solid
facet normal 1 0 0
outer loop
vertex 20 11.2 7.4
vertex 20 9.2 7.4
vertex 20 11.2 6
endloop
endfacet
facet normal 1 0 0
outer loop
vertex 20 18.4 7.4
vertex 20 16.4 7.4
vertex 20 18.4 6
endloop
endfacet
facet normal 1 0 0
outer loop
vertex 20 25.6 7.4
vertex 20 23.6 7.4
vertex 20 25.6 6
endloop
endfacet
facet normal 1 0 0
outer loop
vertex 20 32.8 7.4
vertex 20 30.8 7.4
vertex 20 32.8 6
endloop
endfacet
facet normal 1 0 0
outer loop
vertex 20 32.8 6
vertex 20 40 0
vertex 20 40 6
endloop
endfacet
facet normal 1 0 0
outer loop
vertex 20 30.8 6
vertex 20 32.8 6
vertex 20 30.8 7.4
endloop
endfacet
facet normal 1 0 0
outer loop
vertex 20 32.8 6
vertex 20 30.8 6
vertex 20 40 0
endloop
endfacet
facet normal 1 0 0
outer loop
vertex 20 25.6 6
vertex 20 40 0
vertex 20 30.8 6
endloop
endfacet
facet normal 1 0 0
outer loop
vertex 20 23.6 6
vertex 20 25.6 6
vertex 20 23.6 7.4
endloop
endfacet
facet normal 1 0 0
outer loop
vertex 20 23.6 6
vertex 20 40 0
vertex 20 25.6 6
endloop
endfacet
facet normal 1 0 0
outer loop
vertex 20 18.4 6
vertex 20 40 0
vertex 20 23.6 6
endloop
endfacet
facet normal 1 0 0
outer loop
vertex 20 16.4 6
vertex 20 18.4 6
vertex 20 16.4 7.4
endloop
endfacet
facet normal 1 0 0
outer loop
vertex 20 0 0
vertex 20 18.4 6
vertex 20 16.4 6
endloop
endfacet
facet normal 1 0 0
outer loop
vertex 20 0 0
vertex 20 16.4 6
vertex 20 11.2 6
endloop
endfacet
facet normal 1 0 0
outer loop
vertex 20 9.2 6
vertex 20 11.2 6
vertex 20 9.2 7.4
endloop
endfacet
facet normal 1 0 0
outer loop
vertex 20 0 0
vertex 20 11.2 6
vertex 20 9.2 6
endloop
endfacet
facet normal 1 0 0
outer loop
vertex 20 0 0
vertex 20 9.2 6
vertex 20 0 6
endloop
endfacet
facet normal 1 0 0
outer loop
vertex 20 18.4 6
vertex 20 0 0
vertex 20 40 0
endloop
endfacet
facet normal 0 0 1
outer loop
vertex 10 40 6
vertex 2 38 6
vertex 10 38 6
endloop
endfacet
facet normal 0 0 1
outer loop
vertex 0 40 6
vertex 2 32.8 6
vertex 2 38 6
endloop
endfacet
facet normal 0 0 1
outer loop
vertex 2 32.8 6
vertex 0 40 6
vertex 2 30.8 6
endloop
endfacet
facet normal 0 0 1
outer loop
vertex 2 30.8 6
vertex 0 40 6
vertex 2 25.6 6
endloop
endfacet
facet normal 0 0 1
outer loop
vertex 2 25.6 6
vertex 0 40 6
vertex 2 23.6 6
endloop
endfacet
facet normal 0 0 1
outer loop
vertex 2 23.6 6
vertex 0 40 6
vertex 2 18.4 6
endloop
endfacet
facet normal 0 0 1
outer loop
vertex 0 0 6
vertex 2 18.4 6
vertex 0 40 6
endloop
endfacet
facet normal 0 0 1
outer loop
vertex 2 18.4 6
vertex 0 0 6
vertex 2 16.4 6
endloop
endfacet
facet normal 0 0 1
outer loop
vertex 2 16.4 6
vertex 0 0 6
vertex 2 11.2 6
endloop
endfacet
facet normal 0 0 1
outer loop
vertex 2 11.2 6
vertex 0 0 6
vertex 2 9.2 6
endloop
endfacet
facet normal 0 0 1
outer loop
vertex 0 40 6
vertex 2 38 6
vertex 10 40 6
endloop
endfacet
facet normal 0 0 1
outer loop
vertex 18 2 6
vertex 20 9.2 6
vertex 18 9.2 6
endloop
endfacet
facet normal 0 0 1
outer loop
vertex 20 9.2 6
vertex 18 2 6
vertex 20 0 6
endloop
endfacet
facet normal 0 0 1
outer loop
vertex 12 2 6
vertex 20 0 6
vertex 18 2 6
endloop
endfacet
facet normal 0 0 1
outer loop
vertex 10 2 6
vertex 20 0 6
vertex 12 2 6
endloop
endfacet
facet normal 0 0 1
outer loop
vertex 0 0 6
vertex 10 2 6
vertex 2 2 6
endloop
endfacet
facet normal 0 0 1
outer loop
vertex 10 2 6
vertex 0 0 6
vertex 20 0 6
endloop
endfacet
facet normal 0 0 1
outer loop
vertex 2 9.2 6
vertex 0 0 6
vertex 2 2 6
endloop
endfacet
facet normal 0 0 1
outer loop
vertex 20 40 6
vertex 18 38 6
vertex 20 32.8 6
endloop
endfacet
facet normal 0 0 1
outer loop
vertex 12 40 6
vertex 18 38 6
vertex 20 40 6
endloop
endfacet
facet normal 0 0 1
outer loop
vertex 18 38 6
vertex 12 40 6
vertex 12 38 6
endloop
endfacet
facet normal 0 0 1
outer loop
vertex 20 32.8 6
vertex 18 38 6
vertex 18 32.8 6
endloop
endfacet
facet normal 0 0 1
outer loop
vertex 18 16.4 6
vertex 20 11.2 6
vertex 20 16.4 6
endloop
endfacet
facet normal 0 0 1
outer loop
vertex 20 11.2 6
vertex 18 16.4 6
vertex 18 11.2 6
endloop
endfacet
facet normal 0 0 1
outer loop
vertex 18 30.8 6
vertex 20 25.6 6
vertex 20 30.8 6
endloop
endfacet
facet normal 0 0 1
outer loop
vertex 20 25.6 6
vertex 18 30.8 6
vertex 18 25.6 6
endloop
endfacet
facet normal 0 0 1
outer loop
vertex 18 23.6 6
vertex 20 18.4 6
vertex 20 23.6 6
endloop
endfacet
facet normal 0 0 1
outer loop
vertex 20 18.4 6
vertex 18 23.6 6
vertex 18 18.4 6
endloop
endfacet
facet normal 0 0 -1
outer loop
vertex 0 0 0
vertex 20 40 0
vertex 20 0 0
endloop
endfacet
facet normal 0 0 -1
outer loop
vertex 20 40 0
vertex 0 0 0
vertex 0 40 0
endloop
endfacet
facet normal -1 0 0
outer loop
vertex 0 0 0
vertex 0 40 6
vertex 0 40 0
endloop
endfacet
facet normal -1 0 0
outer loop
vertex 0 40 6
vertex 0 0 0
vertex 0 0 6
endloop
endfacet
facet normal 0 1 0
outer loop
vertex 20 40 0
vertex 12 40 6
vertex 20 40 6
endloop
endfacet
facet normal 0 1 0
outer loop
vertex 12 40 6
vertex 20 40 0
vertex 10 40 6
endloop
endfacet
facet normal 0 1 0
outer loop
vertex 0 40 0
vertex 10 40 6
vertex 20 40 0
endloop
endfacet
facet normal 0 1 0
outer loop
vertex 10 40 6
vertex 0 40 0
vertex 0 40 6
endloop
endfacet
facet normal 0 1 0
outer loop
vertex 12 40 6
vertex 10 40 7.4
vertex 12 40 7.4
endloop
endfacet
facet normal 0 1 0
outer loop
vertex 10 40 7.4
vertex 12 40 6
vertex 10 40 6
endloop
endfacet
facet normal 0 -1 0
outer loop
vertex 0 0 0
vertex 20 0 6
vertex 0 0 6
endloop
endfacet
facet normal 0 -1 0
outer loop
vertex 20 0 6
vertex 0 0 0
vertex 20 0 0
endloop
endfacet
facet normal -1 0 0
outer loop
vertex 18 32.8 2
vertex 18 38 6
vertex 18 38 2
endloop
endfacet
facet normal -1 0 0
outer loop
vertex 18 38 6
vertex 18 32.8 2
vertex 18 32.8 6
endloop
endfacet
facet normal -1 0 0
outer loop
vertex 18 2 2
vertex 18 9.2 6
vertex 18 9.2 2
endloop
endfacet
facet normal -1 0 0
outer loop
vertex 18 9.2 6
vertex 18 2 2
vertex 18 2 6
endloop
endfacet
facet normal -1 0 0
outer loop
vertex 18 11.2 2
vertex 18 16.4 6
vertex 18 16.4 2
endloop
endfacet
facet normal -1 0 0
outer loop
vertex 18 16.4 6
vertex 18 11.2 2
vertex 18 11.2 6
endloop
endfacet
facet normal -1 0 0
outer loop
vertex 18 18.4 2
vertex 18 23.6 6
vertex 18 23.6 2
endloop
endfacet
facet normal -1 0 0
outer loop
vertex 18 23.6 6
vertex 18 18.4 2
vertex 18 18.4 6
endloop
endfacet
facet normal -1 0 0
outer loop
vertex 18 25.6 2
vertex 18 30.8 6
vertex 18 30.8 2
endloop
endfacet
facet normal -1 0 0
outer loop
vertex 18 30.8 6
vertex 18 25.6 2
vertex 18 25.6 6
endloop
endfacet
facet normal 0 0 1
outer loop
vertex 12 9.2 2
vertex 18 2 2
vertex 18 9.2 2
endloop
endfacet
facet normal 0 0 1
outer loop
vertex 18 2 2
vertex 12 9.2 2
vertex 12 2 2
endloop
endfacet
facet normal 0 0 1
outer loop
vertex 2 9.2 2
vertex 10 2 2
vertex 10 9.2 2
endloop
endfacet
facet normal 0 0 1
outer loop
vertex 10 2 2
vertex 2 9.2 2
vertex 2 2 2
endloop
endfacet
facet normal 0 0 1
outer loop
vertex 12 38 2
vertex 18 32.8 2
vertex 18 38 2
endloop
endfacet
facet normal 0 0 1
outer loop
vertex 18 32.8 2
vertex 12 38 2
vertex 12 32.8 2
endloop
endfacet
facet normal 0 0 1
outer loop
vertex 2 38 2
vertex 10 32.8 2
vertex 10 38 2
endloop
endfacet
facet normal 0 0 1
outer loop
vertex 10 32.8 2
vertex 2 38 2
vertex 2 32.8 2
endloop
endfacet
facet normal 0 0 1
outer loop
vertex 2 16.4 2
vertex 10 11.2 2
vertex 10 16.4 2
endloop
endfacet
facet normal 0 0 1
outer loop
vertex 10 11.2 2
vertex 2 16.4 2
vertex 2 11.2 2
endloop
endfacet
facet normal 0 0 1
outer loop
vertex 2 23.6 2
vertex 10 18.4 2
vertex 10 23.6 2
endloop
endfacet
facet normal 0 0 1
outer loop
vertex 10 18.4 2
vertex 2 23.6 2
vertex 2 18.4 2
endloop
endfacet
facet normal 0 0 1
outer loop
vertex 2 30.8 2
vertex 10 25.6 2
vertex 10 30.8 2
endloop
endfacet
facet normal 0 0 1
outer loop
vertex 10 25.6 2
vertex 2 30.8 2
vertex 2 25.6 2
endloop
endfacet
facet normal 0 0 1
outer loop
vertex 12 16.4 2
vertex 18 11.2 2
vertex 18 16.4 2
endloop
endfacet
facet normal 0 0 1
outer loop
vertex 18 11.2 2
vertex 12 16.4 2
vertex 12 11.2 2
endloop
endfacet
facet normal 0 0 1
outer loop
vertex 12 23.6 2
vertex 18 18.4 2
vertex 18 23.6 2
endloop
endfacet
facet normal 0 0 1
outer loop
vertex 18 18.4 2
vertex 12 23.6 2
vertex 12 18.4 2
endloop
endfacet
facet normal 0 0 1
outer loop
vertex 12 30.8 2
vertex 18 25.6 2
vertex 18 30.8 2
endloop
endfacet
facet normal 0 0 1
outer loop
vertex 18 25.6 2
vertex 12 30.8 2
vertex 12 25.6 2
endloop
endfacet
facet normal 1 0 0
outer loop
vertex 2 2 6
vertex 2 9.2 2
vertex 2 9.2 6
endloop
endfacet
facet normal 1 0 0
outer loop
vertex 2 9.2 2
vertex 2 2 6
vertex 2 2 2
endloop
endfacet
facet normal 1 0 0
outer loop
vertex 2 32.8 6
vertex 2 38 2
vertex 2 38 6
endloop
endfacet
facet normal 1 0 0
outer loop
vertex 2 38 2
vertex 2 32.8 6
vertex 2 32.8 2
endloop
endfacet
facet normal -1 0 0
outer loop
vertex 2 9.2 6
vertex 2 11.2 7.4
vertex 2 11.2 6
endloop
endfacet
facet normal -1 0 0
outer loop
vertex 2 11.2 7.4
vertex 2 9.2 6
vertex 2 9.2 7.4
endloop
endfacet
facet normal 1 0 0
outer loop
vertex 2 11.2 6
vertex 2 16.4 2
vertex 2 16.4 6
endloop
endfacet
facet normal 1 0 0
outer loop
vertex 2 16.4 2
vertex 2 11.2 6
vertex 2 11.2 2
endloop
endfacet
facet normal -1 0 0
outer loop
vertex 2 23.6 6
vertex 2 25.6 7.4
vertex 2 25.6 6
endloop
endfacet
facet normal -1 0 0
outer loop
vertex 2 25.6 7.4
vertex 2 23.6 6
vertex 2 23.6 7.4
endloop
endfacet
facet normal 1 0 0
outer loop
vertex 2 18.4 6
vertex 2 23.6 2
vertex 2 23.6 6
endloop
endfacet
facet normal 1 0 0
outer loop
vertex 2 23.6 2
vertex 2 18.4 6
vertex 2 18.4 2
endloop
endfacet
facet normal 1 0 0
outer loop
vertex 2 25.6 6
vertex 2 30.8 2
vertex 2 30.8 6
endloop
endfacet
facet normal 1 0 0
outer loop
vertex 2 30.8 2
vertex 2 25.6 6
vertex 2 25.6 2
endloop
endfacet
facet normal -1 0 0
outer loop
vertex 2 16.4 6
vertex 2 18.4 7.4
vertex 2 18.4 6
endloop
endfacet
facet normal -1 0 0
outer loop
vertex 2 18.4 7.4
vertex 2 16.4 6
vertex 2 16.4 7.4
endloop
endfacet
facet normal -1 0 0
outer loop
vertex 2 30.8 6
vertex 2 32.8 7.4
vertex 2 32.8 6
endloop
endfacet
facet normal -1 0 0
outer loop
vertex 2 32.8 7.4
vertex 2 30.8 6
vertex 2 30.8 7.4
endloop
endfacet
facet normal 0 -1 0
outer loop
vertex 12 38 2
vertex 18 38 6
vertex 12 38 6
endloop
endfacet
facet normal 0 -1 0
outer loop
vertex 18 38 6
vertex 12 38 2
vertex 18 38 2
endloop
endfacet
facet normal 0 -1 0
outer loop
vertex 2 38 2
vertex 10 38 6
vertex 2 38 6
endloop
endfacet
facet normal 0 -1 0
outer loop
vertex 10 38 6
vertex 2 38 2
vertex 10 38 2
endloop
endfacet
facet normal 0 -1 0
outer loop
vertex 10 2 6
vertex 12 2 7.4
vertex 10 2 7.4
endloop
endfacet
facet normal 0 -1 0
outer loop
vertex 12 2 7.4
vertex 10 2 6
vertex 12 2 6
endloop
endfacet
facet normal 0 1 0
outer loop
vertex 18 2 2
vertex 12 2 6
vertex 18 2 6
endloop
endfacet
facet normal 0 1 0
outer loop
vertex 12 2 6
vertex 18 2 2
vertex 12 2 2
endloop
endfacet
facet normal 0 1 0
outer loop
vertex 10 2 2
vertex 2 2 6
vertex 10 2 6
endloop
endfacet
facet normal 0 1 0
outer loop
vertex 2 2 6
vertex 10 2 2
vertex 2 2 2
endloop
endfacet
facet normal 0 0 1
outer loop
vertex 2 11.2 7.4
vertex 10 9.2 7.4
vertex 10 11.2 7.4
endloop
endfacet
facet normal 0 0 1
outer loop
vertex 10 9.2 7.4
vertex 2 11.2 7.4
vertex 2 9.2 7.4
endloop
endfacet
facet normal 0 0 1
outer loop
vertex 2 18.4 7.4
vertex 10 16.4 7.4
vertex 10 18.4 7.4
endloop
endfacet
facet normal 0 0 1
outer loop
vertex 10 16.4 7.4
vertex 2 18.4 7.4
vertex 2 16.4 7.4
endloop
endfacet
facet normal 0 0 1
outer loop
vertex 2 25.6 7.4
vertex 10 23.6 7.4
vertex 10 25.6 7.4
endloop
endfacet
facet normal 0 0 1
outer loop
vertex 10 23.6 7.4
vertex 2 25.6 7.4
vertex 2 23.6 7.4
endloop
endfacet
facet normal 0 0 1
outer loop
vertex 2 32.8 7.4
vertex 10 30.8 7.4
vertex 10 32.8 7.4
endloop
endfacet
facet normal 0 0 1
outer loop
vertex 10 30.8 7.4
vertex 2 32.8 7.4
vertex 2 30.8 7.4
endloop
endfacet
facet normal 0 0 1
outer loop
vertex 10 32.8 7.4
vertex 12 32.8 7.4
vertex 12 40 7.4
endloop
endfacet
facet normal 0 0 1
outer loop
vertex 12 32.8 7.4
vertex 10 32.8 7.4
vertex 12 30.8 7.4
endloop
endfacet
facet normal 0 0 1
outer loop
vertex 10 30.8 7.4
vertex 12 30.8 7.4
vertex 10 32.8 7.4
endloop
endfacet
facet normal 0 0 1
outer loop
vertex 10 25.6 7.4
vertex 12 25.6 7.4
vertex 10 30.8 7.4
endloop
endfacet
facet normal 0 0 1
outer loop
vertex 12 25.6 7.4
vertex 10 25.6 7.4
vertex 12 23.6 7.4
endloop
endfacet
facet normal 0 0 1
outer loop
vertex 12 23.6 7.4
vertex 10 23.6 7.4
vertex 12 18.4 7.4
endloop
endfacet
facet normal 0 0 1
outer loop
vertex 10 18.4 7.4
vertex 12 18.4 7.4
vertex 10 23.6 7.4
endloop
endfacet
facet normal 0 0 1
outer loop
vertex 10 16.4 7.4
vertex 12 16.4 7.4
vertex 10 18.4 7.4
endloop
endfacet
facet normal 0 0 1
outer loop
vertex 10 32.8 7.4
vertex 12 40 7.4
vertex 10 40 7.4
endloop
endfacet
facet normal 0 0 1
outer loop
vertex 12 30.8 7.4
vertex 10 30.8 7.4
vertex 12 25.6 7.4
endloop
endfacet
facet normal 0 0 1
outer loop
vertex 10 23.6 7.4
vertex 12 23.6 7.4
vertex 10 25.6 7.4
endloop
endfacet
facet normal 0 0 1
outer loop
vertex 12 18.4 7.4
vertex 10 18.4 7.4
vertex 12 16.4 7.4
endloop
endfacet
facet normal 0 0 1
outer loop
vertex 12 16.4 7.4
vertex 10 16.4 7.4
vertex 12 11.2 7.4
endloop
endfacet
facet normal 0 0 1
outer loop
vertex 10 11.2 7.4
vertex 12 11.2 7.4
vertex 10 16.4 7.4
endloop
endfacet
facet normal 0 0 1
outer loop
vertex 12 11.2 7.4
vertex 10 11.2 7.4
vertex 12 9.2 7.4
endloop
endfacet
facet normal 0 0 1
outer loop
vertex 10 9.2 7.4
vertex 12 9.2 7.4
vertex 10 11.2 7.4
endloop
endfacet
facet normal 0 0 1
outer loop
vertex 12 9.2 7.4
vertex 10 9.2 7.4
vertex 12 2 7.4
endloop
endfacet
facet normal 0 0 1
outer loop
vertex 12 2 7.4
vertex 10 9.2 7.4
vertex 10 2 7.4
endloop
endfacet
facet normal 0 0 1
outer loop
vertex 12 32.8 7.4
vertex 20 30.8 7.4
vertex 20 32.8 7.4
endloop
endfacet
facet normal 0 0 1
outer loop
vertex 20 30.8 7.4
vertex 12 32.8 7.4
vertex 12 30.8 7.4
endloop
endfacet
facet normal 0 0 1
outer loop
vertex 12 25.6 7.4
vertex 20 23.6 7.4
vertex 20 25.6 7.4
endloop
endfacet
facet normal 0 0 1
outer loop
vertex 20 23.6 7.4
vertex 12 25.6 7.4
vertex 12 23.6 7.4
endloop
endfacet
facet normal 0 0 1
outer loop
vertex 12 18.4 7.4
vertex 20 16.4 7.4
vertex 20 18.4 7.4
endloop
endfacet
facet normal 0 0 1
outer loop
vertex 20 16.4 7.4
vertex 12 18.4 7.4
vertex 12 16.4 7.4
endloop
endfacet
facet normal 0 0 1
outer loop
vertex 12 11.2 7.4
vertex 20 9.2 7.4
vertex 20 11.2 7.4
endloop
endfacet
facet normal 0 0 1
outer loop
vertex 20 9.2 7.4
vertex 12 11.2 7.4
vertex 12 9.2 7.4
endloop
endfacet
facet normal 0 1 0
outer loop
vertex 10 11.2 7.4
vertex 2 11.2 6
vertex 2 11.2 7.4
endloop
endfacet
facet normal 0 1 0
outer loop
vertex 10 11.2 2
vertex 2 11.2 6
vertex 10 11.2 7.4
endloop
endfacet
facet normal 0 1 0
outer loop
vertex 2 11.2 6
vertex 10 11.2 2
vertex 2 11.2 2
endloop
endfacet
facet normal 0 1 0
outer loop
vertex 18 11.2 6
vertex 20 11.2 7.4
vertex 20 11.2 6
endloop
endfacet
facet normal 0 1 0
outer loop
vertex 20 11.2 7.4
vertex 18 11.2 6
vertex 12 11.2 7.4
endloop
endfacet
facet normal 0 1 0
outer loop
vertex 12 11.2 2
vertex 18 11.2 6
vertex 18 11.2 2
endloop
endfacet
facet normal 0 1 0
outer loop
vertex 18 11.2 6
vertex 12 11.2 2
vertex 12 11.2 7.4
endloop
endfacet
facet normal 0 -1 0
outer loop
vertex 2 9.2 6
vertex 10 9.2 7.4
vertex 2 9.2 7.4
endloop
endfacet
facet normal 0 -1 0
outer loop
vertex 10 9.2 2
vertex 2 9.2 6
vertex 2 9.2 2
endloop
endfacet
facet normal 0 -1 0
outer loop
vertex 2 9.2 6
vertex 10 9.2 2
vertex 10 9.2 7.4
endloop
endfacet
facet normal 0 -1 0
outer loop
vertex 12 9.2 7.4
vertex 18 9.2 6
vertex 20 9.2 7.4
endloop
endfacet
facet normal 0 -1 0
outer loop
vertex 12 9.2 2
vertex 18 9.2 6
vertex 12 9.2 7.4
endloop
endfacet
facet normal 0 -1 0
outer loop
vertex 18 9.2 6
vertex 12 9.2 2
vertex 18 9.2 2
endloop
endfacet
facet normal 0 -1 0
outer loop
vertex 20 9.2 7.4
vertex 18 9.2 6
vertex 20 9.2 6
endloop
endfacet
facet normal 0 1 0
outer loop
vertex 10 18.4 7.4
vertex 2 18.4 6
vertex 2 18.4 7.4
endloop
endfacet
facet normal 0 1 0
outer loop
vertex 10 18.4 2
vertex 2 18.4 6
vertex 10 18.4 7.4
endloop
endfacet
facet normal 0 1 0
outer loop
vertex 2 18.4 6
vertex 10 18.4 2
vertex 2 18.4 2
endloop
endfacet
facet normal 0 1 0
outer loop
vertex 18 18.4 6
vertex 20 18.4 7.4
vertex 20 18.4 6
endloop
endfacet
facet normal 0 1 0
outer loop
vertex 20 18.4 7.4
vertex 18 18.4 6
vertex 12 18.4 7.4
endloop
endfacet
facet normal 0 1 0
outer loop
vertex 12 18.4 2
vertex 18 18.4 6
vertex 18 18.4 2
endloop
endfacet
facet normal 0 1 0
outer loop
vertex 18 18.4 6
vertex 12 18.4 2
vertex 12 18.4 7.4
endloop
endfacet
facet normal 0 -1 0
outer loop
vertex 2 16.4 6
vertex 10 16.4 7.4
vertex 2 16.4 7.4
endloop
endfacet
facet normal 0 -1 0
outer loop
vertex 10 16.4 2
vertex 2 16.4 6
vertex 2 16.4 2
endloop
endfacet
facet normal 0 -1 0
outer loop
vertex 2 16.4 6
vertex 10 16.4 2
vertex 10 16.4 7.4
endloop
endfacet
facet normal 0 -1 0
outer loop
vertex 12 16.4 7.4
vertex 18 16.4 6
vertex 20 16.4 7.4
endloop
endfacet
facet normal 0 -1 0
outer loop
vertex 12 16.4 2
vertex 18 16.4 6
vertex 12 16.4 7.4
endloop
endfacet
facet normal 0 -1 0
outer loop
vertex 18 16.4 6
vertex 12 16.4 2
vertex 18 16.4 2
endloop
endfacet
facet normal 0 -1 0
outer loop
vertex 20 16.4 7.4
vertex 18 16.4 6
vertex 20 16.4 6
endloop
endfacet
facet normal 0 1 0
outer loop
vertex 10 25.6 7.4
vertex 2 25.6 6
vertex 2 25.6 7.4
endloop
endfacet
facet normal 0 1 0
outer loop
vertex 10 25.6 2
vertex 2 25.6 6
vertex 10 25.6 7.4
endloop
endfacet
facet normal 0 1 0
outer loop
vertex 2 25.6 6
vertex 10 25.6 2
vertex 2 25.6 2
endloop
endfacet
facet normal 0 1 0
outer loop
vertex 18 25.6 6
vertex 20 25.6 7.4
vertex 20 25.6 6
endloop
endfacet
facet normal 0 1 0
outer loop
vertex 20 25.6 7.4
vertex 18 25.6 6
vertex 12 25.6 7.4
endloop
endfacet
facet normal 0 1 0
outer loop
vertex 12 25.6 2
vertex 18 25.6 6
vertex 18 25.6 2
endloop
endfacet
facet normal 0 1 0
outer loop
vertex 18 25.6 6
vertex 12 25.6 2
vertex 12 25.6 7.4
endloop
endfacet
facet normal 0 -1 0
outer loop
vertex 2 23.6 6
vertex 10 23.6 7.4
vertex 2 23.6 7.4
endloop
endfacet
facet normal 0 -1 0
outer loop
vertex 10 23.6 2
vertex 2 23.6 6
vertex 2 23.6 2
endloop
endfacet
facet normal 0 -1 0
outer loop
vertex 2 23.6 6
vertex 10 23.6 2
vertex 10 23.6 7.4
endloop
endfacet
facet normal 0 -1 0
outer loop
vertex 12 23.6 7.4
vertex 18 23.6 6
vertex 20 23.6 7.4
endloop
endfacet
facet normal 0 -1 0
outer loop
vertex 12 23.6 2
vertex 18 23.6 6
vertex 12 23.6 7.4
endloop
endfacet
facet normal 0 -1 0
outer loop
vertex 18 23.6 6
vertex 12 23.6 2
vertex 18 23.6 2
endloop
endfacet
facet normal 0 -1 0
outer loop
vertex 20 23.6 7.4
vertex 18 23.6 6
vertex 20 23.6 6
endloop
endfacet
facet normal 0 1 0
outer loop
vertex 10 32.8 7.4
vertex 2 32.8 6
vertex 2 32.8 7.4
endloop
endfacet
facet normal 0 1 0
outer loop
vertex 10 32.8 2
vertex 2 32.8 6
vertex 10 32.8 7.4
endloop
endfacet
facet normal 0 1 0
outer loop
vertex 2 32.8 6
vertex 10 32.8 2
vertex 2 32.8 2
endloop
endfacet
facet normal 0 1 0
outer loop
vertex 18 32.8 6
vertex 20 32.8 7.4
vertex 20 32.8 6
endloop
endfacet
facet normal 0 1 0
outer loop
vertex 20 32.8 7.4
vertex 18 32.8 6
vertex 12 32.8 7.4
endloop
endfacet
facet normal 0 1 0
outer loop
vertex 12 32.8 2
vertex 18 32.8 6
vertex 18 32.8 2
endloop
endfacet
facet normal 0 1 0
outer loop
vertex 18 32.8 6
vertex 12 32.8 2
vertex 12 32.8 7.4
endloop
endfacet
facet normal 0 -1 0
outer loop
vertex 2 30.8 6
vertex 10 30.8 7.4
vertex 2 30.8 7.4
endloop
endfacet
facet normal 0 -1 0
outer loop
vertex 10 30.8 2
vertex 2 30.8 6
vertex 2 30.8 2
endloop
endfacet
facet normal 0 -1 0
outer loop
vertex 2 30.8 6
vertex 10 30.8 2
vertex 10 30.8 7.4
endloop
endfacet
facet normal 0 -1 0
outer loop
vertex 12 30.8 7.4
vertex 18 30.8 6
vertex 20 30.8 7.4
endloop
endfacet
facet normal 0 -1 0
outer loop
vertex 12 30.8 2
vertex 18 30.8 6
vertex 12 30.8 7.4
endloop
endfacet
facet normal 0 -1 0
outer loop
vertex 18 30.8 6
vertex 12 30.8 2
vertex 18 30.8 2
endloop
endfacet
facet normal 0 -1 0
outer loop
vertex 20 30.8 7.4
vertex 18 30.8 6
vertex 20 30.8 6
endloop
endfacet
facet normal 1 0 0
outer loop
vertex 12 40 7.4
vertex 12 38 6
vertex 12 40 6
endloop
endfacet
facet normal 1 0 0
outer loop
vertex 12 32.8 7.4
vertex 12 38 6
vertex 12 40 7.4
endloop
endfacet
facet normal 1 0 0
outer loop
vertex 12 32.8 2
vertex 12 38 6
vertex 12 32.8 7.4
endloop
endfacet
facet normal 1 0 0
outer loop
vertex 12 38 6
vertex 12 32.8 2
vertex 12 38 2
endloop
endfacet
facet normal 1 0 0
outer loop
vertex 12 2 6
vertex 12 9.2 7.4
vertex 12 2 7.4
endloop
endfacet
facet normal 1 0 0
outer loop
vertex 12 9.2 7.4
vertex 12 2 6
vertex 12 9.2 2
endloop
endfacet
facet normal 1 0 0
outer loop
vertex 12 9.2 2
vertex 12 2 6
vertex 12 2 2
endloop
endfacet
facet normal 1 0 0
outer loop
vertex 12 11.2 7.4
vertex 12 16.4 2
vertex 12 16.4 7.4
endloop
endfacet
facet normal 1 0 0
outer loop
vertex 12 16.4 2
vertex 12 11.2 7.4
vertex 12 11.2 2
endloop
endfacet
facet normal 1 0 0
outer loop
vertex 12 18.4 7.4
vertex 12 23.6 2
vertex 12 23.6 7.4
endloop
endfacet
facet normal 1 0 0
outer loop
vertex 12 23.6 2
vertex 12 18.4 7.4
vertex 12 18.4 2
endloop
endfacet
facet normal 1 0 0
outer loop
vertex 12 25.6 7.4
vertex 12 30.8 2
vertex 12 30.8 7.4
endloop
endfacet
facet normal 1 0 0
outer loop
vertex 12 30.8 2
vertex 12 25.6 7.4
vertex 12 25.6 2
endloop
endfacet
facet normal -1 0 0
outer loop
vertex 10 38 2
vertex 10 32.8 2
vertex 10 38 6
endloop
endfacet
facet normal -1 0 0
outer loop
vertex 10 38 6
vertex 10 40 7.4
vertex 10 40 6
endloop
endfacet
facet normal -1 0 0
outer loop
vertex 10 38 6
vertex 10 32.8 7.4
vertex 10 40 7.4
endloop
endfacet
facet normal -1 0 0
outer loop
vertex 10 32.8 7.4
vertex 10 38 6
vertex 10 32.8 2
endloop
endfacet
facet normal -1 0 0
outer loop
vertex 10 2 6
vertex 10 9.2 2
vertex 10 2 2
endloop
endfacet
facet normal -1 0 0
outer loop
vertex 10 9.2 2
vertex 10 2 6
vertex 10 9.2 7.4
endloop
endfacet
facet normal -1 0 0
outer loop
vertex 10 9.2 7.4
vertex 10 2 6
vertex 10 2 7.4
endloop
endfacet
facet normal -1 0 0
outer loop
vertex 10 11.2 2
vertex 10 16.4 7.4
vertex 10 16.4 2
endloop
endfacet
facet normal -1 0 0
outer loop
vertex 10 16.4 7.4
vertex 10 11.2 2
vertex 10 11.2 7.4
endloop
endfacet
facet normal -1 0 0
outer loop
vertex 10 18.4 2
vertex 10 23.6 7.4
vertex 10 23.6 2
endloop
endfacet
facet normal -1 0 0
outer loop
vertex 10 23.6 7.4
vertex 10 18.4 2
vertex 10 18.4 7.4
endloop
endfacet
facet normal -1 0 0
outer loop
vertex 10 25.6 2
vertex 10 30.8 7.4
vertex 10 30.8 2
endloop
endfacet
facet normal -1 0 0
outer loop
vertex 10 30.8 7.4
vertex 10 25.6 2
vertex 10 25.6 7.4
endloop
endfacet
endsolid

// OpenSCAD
// This file is designed to replicate box design. It will take arguments for length, width, and height. Number of cut out sections. 
// Wall thickness is 2 mm

// All measurements in mm. Added 0.2 to all dimentions for PLA shrinkage.


module Box_equal_volume_horizontal (Box_Width,Box_Length,Box_Height,Number_of_Cut_outs){
Wall_thickness = 2;
//create hollow box
difference(){        
    cube([Box_Width,Box_Length,Box_Height]);    
    translate([Wall_thickness , Wall_thickness, Wall_thickness])
    cube([Box_Width-(2*Wall_thickness),Box_Length-(2*Wall_thickness),Box_Height]);       
}

//create walls subdivng the box
Delta_Y =  (Box_Length-(2*Wall_thickness))/Number_of_Cut_outs;

for (ii =[1:1:Number_of_Cut_outs-1]){

Y_pos_wall = Wall_thickness + Delta_Y * ii;
    
translate([Wall_thickness , Y_pos_wall , Wall_thickness])
cube([Box_Width-Wall_thickness,Wall_thickness,Box_Height*0.9]);
    
}
translate([Box_Width/2 , Wall_thickness , Wall_thickness])
cube([Wall_thickness,Box_Length-Wall_thickness,Box_Height*0.9]);

}


Box_equal_volume_horizontal (20,40,6,5);
